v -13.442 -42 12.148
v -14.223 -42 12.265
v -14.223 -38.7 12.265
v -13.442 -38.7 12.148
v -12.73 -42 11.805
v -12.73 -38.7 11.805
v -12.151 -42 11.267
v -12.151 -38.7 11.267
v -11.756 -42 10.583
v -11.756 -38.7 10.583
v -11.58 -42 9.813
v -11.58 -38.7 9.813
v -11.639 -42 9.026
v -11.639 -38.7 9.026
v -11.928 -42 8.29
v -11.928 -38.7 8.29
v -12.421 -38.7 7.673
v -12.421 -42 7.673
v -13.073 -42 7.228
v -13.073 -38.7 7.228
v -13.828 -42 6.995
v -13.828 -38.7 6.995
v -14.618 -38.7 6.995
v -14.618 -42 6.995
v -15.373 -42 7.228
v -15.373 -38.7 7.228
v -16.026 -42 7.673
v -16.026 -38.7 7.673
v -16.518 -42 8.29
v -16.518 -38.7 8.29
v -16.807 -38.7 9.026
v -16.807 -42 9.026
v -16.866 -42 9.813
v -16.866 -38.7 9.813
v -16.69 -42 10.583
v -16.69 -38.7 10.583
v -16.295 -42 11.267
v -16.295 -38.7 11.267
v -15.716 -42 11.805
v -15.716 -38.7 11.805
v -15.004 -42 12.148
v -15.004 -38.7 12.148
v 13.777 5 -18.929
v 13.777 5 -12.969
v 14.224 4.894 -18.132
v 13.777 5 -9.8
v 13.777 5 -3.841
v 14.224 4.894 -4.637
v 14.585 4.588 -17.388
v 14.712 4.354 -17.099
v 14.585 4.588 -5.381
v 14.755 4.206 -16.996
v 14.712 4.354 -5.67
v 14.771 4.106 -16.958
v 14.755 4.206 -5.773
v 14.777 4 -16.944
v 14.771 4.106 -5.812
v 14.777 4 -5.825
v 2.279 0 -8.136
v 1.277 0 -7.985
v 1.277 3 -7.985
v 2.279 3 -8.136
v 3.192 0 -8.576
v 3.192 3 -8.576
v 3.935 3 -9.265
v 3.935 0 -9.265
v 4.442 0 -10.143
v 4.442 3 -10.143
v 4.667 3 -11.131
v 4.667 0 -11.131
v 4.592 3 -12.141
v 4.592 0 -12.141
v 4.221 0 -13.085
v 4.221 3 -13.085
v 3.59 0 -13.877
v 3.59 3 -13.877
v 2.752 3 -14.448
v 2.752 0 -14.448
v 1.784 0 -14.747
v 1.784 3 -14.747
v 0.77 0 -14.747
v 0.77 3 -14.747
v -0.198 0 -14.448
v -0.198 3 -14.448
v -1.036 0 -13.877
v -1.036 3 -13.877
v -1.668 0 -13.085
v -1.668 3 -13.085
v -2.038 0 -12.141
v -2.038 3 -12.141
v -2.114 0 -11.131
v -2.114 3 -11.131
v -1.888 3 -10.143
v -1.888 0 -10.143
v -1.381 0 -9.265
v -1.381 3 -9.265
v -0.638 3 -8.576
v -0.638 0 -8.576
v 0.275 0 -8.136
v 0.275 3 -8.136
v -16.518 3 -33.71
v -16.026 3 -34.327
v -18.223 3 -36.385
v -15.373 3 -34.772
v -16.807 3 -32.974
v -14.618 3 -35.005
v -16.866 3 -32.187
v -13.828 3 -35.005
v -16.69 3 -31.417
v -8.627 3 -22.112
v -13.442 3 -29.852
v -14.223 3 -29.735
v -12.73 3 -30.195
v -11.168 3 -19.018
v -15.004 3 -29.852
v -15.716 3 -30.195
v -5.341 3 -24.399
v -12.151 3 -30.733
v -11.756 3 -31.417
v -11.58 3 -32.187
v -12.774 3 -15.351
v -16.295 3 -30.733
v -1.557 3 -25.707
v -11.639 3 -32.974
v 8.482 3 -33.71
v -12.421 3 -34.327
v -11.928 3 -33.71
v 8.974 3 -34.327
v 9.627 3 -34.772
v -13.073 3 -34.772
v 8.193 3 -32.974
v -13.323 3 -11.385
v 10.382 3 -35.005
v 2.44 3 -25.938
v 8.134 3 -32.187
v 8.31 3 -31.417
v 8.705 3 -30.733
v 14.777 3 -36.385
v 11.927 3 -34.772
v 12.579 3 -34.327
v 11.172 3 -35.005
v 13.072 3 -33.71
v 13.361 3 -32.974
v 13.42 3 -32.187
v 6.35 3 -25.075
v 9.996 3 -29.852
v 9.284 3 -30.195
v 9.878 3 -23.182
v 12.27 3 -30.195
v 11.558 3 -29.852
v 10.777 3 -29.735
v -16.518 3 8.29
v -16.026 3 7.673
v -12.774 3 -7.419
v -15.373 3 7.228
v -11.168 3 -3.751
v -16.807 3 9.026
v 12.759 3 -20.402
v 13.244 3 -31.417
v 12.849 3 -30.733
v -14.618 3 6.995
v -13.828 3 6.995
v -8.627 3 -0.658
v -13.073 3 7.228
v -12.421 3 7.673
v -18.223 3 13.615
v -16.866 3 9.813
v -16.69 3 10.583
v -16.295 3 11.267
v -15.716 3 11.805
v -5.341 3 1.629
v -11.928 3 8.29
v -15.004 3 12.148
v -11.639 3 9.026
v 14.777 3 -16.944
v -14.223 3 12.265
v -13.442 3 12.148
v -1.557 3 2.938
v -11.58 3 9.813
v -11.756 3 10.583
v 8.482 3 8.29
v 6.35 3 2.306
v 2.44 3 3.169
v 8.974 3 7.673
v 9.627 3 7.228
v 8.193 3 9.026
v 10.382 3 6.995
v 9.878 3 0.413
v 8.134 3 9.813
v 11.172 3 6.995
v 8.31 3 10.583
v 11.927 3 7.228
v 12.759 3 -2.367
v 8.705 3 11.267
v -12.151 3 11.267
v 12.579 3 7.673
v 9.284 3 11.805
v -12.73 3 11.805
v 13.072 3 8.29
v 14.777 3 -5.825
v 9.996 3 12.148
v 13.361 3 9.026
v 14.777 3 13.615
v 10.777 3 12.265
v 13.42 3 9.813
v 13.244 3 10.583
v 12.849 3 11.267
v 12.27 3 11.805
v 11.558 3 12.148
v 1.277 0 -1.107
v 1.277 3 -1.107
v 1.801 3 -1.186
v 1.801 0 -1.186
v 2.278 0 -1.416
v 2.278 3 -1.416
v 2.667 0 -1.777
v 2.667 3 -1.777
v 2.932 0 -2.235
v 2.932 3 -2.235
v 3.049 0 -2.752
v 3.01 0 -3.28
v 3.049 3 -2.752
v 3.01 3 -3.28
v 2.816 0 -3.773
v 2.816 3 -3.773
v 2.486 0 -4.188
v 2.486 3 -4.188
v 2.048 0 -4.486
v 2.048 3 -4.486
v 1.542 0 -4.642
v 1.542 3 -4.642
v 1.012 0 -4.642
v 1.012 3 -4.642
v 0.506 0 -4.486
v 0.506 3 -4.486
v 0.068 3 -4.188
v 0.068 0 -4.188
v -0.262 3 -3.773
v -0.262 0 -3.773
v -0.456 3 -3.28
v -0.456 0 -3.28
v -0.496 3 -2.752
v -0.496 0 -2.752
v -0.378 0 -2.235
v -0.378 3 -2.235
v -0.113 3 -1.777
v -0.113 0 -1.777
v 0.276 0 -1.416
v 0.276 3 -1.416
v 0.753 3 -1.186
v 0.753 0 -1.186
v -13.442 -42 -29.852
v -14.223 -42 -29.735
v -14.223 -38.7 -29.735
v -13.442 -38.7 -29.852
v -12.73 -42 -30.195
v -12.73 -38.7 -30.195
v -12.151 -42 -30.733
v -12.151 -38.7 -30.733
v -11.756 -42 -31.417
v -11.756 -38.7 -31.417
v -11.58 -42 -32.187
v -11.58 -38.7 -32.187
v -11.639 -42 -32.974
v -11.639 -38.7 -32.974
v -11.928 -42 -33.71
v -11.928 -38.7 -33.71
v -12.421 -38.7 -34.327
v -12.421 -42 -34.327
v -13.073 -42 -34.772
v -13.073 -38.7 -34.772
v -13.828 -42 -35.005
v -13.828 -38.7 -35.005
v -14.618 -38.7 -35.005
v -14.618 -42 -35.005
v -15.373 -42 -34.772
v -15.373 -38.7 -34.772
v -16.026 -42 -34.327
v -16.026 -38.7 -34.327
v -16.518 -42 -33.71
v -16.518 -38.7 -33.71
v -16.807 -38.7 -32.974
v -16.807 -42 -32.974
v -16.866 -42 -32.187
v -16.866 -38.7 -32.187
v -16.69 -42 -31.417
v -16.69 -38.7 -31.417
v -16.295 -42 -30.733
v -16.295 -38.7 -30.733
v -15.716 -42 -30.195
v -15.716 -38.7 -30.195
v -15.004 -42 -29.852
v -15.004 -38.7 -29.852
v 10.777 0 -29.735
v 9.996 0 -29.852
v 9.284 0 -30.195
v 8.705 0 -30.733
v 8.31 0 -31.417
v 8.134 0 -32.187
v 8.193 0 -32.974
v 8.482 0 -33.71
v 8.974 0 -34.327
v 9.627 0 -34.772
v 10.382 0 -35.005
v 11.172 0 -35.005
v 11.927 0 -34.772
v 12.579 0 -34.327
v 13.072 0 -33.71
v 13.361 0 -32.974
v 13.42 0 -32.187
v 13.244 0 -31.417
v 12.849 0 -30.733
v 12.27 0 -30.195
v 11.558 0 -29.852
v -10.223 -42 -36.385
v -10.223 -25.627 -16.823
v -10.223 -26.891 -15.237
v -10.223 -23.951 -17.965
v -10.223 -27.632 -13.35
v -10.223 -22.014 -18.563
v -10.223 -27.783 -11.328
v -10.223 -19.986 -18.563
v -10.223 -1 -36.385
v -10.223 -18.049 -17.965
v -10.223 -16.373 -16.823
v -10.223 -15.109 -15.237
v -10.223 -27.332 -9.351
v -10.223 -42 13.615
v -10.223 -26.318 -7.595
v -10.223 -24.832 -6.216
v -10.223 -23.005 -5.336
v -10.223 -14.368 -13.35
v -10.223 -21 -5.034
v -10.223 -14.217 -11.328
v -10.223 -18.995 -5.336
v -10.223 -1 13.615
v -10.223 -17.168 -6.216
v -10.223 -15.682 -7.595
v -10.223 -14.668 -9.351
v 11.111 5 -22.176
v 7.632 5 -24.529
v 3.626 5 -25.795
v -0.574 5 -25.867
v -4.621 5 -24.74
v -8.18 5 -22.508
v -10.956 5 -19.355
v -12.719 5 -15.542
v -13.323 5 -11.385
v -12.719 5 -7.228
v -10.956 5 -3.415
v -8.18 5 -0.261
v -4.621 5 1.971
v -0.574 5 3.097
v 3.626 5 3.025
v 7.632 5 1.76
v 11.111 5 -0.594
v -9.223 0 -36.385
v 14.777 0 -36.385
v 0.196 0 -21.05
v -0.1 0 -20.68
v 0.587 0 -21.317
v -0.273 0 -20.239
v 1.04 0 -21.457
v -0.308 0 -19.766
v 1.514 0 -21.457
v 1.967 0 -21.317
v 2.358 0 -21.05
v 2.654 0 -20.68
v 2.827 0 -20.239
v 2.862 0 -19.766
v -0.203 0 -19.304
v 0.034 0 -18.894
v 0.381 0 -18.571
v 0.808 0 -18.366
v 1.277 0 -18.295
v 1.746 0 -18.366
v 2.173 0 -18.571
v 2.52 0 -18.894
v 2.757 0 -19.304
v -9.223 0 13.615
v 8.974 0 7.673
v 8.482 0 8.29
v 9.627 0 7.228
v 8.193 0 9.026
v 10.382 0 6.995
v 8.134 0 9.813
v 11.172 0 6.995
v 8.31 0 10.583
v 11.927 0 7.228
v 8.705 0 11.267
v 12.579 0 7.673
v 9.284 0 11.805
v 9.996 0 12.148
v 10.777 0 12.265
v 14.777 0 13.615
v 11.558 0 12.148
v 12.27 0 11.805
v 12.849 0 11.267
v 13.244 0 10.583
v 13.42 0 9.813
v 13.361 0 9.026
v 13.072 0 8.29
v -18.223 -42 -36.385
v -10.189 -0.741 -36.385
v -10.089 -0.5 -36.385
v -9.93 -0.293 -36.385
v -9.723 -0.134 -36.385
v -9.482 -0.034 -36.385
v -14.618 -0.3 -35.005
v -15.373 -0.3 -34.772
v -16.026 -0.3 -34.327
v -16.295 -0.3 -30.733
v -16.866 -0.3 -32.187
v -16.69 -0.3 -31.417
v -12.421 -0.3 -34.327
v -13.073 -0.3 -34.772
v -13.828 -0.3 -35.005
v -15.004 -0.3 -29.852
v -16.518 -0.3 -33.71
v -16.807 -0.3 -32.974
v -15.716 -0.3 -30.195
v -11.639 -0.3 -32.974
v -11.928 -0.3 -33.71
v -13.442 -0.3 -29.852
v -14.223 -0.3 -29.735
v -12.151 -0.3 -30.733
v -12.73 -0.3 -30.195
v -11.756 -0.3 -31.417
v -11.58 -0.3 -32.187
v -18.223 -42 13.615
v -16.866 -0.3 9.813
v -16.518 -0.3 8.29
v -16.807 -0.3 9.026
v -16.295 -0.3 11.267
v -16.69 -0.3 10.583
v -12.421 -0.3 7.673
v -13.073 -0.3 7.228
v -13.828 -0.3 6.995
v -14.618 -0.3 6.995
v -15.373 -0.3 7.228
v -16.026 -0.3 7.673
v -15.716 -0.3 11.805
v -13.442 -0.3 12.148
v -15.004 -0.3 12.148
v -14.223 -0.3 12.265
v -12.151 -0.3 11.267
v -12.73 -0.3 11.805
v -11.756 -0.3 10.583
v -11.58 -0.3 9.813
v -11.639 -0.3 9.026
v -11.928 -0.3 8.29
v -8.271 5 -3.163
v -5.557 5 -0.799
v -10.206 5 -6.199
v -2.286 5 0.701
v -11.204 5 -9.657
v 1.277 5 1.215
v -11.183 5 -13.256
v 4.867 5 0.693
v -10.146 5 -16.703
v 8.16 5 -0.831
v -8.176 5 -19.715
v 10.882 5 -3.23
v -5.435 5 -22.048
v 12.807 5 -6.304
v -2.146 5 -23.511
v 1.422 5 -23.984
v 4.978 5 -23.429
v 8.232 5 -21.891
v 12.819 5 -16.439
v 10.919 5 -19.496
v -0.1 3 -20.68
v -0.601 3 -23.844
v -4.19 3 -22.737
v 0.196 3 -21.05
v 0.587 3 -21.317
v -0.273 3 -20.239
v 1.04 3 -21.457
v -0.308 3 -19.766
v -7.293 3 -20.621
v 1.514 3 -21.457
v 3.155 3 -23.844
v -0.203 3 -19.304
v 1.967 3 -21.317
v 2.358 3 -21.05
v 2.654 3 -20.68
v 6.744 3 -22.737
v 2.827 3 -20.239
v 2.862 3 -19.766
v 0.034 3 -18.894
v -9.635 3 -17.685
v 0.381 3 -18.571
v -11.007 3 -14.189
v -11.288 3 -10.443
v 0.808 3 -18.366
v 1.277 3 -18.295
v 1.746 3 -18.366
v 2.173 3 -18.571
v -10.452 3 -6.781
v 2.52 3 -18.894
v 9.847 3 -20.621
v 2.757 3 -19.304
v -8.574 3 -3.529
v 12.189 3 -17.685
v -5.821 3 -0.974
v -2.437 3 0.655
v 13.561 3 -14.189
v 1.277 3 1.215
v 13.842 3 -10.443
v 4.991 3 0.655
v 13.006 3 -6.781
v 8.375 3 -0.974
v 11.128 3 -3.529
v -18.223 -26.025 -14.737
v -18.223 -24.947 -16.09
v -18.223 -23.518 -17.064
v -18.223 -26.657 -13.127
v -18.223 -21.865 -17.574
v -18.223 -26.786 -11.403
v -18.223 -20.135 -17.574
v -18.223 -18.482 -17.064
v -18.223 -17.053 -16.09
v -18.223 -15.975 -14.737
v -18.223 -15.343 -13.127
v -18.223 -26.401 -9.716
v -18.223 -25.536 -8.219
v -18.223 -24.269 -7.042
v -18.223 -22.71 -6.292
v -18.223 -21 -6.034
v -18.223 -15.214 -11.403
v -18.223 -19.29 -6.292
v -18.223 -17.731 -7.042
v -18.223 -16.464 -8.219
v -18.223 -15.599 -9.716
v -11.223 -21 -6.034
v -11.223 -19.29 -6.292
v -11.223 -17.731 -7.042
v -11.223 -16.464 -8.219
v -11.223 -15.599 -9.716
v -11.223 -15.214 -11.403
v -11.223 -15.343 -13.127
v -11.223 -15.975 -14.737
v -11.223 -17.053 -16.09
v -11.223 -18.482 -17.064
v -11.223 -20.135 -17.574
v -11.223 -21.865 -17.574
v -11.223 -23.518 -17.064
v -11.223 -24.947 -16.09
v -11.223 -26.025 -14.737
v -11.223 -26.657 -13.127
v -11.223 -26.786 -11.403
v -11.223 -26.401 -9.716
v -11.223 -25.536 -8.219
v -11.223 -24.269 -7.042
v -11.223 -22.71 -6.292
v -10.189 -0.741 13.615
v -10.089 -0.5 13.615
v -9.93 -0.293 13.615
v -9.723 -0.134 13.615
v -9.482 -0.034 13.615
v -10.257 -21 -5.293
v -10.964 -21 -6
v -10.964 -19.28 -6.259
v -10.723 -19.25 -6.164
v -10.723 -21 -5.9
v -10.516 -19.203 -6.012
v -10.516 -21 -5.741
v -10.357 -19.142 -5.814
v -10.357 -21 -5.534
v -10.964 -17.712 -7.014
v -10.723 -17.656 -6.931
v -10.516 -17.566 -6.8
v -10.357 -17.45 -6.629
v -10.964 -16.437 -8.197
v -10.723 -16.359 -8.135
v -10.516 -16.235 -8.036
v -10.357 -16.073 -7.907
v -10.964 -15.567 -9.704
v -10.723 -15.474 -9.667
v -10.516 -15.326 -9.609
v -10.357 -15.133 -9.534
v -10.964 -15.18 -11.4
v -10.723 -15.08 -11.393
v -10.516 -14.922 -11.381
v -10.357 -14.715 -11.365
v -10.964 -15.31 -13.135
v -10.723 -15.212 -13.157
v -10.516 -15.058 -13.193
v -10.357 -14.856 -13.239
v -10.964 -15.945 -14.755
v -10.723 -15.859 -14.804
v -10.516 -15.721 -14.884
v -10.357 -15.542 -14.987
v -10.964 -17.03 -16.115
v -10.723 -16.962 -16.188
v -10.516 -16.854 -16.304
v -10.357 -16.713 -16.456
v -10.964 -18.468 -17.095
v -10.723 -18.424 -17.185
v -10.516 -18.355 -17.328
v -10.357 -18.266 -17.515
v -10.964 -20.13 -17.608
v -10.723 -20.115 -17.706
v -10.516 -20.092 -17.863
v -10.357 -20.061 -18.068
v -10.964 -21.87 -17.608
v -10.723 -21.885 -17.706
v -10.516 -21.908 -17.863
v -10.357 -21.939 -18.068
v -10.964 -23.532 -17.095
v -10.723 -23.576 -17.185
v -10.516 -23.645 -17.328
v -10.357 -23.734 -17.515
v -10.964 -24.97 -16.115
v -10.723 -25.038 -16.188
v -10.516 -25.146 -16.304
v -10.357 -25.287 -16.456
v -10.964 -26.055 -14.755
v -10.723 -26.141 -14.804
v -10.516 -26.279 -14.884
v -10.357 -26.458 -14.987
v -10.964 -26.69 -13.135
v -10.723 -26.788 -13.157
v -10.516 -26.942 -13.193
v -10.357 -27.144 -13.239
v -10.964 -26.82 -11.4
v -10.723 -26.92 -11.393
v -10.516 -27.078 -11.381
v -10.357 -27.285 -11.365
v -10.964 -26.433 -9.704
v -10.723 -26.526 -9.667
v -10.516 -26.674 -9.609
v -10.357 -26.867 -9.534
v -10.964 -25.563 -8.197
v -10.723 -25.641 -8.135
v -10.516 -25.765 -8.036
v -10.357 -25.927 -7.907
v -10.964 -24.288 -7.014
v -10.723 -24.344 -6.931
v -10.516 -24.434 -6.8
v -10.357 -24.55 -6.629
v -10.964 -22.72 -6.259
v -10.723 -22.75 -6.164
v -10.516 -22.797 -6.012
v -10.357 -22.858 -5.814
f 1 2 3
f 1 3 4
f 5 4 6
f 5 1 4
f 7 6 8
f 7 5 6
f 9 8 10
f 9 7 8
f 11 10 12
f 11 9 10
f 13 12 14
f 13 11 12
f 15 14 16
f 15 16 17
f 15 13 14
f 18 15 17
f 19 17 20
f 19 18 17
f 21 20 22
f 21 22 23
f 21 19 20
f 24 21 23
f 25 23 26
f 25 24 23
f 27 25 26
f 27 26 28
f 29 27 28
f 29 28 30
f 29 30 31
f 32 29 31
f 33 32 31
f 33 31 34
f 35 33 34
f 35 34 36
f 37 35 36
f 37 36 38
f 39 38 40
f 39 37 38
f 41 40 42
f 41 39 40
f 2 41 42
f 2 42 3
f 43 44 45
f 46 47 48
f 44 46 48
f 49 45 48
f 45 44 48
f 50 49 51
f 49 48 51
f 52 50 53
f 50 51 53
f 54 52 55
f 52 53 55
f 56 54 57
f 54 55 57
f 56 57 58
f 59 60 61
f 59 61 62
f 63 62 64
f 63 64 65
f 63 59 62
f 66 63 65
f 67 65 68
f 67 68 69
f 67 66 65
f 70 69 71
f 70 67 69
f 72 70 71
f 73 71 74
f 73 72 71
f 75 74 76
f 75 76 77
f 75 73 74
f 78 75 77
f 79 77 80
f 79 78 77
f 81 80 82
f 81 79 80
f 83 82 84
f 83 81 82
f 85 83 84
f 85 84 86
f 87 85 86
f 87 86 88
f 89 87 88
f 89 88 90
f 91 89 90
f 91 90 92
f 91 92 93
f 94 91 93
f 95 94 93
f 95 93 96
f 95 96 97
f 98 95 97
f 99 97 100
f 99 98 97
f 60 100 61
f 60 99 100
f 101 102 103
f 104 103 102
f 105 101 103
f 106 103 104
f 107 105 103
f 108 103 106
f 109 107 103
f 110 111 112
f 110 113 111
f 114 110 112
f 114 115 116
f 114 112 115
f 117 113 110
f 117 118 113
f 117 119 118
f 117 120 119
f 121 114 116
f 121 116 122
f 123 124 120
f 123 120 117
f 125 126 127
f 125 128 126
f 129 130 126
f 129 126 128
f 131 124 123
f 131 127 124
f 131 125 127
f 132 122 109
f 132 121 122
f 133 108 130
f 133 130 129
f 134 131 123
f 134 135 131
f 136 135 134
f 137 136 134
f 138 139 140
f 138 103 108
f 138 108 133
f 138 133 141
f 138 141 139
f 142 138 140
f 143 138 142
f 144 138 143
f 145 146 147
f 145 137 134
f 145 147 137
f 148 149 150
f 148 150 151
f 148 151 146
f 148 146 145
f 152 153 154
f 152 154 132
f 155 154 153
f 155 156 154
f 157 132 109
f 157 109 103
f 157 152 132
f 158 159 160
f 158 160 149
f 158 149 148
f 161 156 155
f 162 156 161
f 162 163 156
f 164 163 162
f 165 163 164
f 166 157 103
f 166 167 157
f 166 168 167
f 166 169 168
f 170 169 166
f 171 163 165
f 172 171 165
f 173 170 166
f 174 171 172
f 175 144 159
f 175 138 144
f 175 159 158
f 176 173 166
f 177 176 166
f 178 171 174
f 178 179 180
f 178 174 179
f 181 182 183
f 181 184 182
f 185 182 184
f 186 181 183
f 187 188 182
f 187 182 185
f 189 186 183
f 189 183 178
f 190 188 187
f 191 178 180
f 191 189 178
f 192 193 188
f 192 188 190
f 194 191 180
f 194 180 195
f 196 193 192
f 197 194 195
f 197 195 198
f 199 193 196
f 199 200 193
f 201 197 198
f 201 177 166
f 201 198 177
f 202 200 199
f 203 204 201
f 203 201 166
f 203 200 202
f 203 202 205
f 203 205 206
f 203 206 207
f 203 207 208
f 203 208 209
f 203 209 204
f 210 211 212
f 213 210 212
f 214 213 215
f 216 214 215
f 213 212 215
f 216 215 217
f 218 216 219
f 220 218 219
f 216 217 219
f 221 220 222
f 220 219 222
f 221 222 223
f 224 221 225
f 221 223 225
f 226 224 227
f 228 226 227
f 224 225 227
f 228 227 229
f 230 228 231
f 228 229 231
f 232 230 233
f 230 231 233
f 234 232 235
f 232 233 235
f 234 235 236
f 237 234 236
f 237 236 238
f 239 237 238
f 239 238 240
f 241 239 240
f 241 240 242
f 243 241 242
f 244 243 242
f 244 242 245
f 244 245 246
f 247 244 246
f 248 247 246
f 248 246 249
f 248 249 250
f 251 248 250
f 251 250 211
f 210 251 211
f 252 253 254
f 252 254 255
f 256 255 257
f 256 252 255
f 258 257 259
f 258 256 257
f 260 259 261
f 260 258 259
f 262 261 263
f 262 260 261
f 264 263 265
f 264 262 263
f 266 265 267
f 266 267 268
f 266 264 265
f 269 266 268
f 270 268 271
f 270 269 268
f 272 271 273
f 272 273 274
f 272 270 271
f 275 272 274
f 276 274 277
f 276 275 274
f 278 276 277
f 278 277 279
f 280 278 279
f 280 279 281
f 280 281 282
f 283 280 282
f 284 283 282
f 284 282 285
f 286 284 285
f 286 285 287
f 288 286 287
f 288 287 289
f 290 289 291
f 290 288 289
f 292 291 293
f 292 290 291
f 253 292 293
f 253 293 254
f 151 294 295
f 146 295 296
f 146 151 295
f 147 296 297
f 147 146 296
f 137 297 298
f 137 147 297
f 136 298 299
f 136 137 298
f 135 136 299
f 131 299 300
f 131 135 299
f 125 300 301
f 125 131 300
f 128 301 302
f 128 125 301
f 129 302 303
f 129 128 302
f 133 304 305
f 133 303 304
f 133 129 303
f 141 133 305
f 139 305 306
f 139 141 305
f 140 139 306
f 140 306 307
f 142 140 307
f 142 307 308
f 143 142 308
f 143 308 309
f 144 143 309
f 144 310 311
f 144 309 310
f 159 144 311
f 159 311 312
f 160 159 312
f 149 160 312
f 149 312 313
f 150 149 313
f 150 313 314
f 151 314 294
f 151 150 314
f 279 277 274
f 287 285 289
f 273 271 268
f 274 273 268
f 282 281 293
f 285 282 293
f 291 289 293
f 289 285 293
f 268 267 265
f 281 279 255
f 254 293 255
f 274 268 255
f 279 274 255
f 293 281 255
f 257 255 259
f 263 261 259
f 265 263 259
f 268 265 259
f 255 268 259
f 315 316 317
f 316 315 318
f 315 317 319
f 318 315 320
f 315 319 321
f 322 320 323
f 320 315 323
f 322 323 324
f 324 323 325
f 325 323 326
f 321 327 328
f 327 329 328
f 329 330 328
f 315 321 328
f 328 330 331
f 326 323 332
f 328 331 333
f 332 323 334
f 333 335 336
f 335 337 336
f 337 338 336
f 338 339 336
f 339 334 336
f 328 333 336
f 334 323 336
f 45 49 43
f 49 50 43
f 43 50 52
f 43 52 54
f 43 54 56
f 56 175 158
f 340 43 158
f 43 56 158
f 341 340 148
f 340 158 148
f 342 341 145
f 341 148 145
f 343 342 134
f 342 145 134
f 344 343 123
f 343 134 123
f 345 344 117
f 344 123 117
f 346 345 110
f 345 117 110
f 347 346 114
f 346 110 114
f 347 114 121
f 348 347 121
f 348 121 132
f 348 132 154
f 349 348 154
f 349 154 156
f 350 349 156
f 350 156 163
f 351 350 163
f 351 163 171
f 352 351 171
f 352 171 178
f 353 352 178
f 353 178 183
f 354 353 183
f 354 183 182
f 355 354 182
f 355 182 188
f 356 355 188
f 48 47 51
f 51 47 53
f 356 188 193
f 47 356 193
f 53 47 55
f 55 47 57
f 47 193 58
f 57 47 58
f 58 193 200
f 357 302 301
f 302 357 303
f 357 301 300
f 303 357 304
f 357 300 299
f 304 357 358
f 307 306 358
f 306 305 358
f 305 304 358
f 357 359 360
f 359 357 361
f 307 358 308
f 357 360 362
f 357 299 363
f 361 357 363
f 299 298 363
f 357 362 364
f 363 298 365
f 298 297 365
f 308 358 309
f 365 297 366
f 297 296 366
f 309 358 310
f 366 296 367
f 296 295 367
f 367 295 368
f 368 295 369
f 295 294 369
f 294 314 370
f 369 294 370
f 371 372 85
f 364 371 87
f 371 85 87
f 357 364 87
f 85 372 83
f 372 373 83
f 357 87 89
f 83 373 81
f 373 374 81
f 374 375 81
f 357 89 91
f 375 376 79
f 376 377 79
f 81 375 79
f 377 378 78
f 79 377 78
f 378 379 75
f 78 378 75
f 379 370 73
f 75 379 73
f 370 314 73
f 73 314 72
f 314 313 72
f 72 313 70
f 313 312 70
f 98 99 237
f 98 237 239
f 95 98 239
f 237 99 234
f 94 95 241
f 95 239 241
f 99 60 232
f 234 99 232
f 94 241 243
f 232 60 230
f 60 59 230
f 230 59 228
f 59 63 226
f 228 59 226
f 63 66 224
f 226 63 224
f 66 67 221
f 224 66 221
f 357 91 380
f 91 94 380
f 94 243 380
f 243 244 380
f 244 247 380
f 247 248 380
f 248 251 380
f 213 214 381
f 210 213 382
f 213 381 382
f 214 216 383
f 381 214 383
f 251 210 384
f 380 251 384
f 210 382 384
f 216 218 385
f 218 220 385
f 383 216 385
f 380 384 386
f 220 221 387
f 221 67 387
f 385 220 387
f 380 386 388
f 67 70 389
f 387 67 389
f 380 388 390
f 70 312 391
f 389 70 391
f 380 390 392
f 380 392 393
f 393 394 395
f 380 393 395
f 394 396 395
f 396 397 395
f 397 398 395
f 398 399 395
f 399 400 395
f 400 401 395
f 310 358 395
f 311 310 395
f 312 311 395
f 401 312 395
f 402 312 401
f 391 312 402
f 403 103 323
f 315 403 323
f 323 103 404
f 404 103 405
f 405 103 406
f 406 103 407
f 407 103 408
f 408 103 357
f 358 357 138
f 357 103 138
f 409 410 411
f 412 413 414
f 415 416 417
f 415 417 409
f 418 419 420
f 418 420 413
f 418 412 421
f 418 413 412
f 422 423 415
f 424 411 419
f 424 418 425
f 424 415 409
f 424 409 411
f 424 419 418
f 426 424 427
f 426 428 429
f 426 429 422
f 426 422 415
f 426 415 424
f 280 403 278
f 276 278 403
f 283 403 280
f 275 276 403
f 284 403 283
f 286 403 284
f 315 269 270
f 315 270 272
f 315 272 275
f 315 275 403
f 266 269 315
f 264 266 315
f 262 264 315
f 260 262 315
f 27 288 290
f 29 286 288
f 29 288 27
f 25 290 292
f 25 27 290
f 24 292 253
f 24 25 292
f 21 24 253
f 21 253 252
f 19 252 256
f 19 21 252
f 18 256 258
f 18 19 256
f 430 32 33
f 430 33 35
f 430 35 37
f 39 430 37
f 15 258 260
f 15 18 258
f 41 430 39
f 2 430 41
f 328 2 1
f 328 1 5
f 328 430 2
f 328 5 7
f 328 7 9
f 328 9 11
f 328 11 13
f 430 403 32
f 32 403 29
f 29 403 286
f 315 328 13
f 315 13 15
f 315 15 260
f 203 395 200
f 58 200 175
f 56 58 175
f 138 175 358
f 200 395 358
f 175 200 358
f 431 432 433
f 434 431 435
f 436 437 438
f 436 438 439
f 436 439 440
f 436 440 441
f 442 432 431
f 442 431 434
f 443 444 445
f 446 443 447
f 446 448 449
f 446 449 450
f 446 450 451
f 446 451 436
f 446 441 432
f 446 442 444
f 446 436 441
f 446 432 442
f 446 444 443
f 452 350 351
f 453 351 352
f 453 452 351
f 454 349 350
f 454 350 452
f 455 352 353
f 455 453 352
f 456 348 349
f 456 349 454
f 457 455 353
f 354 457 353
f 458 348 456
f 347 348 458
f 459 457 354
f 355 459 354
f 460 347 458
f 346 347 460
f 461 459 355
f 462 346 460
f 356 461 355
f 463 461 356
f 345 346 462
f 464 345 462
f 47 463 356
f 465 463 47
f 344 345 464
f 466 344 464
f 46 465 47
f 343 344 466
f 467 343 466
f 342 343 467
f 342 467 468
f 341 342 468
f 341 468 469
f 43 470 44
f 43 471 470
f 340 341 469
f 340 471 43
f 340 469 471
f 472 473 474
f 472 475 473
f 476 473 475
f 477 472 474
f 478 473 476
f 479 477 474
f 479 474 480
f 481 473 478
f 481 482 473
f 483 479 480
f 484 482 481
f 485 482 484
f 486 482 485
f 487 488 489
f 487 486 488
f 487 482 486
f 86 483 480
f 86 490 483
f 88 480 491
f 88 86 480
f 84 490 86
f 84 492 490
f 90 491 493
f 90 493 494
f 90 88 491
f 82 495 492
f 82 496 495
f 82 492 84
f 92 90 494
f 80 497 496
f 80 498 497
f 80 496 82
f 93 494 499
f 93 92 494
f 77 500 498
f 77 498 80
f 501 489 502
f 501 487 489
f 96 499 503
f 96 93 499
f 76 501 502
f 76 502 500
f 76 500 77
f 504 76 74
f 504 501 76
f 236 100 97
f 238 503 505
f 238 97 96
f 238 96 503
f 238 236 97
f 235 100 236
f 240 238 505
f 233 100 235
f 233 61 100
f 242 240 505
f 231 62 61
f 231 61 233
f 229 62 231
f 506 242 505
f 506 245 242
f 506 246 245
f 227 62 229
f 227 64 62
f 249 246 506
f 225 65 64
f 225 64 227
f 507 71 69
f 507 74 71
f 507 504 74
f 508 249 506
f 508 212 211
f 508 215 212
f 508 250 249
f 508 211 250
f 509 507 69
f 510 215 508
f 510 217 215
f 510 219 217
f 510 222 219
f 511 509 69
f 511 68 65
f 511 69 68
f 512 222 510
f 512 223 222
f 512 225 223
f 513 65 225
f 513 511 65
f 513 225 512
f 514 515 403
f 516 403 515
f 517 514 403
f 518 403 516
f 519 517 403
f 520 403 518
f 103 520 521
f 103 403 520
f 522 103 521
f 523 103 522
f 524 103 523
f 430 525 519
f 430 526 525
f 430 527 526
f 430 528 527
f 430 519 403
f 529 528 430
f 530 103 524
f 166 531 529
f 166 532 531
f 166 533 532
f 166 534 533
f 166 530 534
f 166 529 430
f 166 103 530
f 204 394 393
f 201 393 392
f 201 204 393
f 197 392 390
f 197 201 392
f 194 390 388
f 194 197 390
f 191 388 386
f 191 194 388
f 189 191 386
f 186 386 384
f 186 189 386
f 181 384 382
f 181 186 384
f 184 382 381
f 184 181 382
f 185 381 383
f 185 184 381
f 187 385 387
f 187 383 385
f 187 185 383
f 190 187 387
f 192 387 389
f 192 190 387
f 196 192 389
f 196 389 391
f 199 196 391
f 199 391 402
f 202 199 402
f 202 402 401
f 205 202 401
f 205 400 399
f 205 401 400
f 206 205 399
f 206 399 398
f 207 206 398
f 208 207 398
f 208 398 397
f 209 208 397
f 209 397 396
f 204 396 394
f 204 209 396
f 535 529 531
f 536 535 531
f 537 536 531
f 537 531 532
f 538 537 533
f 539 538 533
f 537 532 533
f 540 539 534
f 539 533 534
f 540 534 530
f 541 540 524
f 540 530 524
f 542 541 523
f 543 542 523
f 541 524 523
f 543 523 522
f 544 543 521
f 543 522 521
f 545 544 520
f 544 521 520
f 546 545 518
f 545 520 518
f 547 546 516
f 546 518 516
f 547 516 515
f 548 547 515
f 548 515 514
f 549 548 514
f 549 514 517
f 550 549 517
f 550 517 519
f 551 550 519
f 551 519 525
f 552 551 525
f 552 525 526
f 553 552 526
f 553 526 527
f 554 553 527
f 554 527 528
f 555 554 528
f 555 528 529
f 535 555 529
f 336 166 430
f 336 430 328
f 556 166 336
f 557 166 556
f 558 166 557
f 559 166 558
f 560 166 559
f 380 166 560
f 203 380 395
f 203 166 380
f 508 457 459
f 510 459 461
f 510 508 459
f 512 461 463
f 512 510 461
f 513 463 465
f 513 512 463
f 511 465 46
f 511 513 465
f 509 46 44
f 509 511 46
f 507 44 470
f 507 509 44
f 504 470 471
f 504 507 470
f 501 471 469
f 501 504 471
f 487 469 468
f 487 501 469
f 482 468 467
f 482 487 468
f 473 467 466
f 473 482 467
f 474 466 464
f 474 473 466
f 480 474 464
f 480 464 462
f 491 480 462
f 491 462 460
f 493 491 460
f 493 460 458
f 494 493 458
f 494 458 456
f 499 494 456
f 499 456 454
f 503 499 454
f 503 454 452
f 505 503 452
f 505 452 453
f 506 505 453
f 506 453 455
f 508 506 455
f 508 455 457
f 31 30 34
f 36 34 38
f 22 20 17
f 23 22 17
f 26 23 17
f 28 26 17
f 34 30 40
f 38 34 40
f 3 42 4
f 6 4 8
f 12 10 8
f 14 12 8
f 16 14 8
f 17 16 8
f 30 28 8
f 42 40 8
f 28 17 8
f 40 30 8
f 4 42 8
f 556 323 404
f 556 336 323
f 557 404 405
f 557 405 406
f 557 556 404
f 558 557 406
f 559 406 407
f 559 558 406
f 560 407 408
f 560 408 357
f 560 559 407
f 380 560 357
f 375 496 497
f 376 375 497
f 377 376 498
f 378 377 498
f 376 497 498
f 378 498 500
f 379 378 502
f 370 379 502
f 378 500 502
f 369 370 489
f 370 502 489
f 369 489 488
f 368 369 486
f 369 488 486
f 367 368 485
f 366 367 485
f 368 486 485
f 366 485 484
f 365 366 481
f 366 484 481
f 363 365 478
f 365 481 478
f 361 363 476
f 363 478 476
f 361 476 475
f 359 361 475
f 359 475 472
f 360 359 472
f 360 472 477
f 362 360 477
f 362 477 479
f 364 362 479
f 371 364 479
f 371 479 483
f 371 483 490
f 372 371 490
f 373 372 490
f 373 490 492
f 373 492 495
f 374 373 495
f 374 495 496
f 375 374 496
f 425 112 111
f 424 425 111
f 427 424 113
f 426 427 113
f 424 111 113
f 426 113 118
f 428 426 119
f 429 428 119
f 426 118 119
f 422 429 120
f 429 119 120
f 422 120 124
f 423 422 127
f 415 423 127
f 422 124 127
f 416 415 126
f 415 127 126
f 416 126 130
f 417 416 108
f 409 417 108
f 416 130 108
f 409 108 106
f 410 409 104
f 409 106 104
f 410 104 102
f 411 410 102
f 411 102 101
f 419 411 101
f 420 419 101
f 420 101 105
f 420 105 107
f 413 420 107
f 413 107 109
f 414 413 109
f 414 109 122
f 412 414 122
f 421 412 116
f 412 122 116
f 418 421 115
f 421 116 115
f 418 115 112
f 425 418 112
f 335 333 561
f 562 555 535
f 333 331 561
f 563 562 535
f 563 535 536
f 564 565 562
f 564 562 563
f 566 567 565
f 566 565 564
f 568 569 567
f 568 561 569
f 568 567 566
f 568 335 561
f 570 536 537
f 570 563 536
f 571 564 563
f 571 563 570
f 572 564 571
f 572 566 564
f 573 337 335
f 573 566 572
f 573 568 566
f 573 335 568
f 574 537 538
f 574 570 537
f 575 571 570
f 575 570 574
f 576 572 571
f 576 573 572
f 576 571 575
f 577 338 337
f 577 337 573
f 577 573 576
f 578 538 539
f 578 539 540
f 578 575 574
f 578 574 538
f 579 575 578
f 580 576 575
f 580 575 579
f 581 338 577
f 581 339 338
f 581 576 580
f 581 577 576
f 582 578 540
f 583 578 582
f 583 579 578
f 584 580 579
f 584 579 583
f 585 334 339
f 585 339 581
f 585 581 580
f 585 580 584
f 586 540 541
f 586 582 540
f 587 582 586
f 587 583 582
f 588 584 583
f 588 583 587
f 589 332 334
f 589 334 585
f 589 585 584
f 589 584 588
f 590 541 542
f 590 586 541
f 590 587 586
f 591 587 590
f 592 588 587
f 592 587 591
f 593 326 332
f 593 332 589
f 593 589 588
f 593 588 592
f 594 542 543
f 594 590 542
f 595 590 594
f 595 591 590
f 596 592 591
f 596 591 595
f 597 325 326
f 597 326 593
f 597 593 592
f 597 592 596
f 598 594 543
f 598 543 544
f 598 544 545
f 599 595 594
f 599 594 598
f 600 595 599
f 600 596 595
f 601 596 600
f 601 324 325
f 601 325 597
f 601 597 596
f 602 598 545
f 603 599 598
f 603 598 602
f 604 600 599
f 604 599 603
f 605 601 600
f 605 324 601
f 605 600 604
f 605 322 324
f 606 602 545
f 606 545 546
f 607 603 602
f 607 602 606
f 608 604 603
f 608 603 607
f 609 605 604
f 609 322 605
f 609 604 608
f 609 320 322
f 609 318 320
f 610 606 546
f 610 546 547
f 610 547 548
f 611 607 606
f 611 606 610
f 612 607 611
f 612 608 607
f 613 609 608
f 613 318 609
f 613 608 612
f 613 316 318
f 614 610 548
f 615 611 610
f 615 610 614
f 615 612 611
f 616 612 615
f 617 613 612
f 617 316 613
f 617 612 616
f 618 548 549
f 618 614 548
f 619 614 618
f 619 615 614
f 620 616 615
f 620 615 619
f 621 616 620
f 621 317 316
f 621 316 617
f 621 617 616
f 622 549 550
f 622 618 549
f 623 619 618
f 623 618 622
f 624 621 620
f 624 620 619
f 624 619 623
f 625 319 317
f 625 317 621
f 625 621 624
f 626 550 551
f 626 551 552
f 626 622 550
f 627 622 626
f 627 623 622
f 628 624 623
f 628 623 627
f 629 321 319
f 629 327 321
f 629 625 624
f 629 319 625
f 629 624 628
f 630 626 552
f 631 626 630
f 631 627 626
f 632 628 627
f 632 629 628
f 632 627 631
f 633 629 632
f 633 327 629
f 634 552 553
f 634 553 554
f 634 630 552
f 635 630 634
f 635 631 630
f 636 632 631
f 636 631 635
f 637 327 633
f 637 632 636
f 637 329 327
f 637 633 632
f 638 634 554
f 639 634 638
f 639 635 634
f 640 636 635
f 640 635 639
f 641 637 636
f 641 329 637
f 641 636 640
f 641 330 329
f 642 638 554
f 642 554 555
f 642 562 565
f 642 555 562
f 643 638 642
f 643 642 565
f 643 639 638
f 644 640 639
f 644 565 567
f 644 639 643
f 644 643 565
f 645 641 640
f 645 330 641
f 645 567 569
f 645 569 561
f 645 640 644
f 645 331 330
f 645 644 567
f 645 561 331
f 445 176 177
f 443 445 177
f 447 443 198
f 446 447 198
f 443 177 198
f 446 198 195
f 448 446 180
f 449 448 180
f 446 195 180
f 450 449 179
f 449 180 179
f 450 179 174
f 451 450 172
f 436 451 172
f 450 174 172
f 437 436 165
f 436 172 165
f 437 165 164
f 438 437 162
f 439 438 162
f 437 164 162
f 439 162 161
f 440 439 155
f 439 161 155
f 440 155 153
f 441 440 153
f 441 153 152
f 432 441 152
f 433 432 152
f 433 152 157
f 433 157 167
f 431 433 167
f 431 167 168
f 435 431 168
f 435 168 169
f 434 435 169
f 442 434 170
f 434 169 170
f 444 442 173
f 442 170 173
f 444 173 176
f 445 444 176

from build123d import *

# Parameters (mm, degrees)
SKETCH1_W           = 25
SKETCH1_H           = 50
SKETCH1_R           = 3.4
BOSS_EXTRUDE1_DEPTH = 3
SKETCH2_W           = 50
SKETCH2_H           = 3
BOSS_EXTRUDE2_DEPTH = 8
SKETCH3_W           = 8
SKETCH3_H           = 50
BOSS_EXTRUDE3_DEPTH = 42
SKETCH4_R           = 2.65
CUT_EXTRUDE1_DEPTH  = 3.3
SKETCH5_R           = 5.802370205
CUT_EXTRUDE2_DEPTH  = 9
FILLET2_R           = 1
SKETCH6_R           = 12.6
BOSS_EXTRUDE4_DEPTH = 2
FILLET3_R           = 1
FILLET4_R           = 1
SKETCH8_R           = 1.589780168
SKETCH8_R_2         = 1.777428262
CUT_EXTRUDE3_DEPTH  = 10


with BuildPart() as part:
    # Sketch1 → Boss-Extrude1 (new body)
    with BuildSketch(Plane(origin=(0, 0, 0), x_dir=(1, 0, 0), z_dir=(0, 1, 0))):
        with Locations((2.276951673, 11.384758364)):
            Rectangle(SKETCH1_W, SKETCH1_H)
        with Locations(Location((1.276951673, 11.384758364, 0), (0, 0, 270))):
            Circle(SKETCH1_R, mode=Mode.SUBTRACT)
    extrude(amount=BOSS_EXTRUDE1_DEPTH)

    # Sketch2 → Boss-Extrude2 (add)
    with BuildSketch(Plane.ZY.offset(10.223048327)):
        with Locations((-11.384758364, 1.5)):
            Rectangle(SKETCH2_W, SKETCH2_H)
    extrude(amount=BOSS_EXTRUDE2_DEPTH)

    # Sketch3 → Boss-Extrude3 (add)
    with BuildSketch(Plane.XZ):
        with Locations((-14.223048327, -11.384758364)):
            Rectangle(SKETCH3_W, SKETCH3_H)
    extrude(amount=BOSS_EXTRUDE3_DEPTH)

    # Sketch4 → Cut-Extrude1 (cut)
    with BuildSketch(Plane(origin=(0, 3, 0), x_dir=(1, 0, 0), z_dir=(0, 1, 0))):
        with Locations(Location((-14.223048327, 32.384758364, 0), (0, 0, 270))):
            Circle(SKETCH4_R)
        with Locations(Location((-14.223048327, -9.615241636, 0), (0, 0, 270))):
            Circle(SKETCH4_R)
    cut_extrude1 = extrude(amount=-CUT_EXTRUDE1_DEPTH, mode=Mode.SUBTRACT)

    # Mirror1: Cut-Extrude1 across plane
    add(cut_extrude1.mirror(Plane.ZX.offset(-19.5)), mode=Mode.SUBTRACT)

    # Sketch5 → Cut-Extrude2 (cut)
    with BuildSketch(Plane.ZY.offset(18.223048327)):
        with Locations((-11.836279124, -21)):
            Circle(SKETCH5_R)
    extrude(amount=-CUT_EXTRUDE2_DEPTH, mode=Mode.SUBTRACT)

    # Fillet2
    fillet2_edges = [part.edges().sort_by_distance(p)[0] for p in [
        (-10.223048327, -21, -17.638649329),
    ]]
    fillet(fillet2_edges, radius=FILLET2_R)

    # Mirror2: Cut-Extrude1 across plane
    add(cut_extrude1.mirror(Plane.ZY.offset(1.723048327)), mode=Mode.SUBTRACT)

    # Sketch6 → Boss-Extrude4 (add)
    with BuildSketch(Plane(origin=(0, 3, 0), x_dir=(1, 0, 0), z_dir=(0, 1, 0))):
        with BuildLine():
            Line((14.776951673, 5.825082115), (14.776951673, 16.944434614))
            ThreePointArc((14.776951673, 16.944434614), (-13.323048327, 11.384758364), (14.776951673, 5.825082115))
        make_face()
        with Locations(Location((1.276951673, 11.384758364, 0), (0, 0, 270))):
            Circle(SKETCH6_R, mode=Mode.SUBTRACT)
    extrude(amount=BOSS_EXTRUDE4_DEPTH)

    # Fillet3
    fillet3_edges = [part.edges().sort_by_distance(p)[0] for p in [
        (-10.223048327, 0, -11.384758364),
    ]]
    fillet(fillet3_edges, radius=FILLET3_R)

    # Fillet4
    # the kernel refuses this fillet: 1 mm, written as the material it takes off along each edge
    with BuildSketch(Plane(origin=(14.776951673, 5, -3.325082115), x_dir=(0, -1, 0), z_dir=(0, 0, -1))) as fillet4_piece_1:
        with BuildLine():
            CenterArc((FILLET4_R, FILLET4_R), FILLET4_R, 180, 90)
            Line((0, FILLET4_R), (0, 0))
            Line((0, 0), (FILLET4_R, 0))
        make_face()
    extrude(amount=16.119352499, mode=Mode.SUBTRACT)

    # Sketch8 → Cut-Extrude3 (cut)
    with BuildSketch(Plane(origin=(0, 3, 0), x_dir=(1, 0, 0), z_dir=(0, 1, 0))):
        with Locations(Location((1.276951673, 19.884758364, 0), (0, 0, 270))):
            Circle(SKETCH8_R)
        with Locations(Location((1.276951673, 2.884758364, 0), (0, 0, 270))):
            Circle(SKETCH8_R_2)
    extrude(amount=-CUT_EXTRUDE3_DEPTH, mode=Mode.SUBTRACT)


solid = part.part
